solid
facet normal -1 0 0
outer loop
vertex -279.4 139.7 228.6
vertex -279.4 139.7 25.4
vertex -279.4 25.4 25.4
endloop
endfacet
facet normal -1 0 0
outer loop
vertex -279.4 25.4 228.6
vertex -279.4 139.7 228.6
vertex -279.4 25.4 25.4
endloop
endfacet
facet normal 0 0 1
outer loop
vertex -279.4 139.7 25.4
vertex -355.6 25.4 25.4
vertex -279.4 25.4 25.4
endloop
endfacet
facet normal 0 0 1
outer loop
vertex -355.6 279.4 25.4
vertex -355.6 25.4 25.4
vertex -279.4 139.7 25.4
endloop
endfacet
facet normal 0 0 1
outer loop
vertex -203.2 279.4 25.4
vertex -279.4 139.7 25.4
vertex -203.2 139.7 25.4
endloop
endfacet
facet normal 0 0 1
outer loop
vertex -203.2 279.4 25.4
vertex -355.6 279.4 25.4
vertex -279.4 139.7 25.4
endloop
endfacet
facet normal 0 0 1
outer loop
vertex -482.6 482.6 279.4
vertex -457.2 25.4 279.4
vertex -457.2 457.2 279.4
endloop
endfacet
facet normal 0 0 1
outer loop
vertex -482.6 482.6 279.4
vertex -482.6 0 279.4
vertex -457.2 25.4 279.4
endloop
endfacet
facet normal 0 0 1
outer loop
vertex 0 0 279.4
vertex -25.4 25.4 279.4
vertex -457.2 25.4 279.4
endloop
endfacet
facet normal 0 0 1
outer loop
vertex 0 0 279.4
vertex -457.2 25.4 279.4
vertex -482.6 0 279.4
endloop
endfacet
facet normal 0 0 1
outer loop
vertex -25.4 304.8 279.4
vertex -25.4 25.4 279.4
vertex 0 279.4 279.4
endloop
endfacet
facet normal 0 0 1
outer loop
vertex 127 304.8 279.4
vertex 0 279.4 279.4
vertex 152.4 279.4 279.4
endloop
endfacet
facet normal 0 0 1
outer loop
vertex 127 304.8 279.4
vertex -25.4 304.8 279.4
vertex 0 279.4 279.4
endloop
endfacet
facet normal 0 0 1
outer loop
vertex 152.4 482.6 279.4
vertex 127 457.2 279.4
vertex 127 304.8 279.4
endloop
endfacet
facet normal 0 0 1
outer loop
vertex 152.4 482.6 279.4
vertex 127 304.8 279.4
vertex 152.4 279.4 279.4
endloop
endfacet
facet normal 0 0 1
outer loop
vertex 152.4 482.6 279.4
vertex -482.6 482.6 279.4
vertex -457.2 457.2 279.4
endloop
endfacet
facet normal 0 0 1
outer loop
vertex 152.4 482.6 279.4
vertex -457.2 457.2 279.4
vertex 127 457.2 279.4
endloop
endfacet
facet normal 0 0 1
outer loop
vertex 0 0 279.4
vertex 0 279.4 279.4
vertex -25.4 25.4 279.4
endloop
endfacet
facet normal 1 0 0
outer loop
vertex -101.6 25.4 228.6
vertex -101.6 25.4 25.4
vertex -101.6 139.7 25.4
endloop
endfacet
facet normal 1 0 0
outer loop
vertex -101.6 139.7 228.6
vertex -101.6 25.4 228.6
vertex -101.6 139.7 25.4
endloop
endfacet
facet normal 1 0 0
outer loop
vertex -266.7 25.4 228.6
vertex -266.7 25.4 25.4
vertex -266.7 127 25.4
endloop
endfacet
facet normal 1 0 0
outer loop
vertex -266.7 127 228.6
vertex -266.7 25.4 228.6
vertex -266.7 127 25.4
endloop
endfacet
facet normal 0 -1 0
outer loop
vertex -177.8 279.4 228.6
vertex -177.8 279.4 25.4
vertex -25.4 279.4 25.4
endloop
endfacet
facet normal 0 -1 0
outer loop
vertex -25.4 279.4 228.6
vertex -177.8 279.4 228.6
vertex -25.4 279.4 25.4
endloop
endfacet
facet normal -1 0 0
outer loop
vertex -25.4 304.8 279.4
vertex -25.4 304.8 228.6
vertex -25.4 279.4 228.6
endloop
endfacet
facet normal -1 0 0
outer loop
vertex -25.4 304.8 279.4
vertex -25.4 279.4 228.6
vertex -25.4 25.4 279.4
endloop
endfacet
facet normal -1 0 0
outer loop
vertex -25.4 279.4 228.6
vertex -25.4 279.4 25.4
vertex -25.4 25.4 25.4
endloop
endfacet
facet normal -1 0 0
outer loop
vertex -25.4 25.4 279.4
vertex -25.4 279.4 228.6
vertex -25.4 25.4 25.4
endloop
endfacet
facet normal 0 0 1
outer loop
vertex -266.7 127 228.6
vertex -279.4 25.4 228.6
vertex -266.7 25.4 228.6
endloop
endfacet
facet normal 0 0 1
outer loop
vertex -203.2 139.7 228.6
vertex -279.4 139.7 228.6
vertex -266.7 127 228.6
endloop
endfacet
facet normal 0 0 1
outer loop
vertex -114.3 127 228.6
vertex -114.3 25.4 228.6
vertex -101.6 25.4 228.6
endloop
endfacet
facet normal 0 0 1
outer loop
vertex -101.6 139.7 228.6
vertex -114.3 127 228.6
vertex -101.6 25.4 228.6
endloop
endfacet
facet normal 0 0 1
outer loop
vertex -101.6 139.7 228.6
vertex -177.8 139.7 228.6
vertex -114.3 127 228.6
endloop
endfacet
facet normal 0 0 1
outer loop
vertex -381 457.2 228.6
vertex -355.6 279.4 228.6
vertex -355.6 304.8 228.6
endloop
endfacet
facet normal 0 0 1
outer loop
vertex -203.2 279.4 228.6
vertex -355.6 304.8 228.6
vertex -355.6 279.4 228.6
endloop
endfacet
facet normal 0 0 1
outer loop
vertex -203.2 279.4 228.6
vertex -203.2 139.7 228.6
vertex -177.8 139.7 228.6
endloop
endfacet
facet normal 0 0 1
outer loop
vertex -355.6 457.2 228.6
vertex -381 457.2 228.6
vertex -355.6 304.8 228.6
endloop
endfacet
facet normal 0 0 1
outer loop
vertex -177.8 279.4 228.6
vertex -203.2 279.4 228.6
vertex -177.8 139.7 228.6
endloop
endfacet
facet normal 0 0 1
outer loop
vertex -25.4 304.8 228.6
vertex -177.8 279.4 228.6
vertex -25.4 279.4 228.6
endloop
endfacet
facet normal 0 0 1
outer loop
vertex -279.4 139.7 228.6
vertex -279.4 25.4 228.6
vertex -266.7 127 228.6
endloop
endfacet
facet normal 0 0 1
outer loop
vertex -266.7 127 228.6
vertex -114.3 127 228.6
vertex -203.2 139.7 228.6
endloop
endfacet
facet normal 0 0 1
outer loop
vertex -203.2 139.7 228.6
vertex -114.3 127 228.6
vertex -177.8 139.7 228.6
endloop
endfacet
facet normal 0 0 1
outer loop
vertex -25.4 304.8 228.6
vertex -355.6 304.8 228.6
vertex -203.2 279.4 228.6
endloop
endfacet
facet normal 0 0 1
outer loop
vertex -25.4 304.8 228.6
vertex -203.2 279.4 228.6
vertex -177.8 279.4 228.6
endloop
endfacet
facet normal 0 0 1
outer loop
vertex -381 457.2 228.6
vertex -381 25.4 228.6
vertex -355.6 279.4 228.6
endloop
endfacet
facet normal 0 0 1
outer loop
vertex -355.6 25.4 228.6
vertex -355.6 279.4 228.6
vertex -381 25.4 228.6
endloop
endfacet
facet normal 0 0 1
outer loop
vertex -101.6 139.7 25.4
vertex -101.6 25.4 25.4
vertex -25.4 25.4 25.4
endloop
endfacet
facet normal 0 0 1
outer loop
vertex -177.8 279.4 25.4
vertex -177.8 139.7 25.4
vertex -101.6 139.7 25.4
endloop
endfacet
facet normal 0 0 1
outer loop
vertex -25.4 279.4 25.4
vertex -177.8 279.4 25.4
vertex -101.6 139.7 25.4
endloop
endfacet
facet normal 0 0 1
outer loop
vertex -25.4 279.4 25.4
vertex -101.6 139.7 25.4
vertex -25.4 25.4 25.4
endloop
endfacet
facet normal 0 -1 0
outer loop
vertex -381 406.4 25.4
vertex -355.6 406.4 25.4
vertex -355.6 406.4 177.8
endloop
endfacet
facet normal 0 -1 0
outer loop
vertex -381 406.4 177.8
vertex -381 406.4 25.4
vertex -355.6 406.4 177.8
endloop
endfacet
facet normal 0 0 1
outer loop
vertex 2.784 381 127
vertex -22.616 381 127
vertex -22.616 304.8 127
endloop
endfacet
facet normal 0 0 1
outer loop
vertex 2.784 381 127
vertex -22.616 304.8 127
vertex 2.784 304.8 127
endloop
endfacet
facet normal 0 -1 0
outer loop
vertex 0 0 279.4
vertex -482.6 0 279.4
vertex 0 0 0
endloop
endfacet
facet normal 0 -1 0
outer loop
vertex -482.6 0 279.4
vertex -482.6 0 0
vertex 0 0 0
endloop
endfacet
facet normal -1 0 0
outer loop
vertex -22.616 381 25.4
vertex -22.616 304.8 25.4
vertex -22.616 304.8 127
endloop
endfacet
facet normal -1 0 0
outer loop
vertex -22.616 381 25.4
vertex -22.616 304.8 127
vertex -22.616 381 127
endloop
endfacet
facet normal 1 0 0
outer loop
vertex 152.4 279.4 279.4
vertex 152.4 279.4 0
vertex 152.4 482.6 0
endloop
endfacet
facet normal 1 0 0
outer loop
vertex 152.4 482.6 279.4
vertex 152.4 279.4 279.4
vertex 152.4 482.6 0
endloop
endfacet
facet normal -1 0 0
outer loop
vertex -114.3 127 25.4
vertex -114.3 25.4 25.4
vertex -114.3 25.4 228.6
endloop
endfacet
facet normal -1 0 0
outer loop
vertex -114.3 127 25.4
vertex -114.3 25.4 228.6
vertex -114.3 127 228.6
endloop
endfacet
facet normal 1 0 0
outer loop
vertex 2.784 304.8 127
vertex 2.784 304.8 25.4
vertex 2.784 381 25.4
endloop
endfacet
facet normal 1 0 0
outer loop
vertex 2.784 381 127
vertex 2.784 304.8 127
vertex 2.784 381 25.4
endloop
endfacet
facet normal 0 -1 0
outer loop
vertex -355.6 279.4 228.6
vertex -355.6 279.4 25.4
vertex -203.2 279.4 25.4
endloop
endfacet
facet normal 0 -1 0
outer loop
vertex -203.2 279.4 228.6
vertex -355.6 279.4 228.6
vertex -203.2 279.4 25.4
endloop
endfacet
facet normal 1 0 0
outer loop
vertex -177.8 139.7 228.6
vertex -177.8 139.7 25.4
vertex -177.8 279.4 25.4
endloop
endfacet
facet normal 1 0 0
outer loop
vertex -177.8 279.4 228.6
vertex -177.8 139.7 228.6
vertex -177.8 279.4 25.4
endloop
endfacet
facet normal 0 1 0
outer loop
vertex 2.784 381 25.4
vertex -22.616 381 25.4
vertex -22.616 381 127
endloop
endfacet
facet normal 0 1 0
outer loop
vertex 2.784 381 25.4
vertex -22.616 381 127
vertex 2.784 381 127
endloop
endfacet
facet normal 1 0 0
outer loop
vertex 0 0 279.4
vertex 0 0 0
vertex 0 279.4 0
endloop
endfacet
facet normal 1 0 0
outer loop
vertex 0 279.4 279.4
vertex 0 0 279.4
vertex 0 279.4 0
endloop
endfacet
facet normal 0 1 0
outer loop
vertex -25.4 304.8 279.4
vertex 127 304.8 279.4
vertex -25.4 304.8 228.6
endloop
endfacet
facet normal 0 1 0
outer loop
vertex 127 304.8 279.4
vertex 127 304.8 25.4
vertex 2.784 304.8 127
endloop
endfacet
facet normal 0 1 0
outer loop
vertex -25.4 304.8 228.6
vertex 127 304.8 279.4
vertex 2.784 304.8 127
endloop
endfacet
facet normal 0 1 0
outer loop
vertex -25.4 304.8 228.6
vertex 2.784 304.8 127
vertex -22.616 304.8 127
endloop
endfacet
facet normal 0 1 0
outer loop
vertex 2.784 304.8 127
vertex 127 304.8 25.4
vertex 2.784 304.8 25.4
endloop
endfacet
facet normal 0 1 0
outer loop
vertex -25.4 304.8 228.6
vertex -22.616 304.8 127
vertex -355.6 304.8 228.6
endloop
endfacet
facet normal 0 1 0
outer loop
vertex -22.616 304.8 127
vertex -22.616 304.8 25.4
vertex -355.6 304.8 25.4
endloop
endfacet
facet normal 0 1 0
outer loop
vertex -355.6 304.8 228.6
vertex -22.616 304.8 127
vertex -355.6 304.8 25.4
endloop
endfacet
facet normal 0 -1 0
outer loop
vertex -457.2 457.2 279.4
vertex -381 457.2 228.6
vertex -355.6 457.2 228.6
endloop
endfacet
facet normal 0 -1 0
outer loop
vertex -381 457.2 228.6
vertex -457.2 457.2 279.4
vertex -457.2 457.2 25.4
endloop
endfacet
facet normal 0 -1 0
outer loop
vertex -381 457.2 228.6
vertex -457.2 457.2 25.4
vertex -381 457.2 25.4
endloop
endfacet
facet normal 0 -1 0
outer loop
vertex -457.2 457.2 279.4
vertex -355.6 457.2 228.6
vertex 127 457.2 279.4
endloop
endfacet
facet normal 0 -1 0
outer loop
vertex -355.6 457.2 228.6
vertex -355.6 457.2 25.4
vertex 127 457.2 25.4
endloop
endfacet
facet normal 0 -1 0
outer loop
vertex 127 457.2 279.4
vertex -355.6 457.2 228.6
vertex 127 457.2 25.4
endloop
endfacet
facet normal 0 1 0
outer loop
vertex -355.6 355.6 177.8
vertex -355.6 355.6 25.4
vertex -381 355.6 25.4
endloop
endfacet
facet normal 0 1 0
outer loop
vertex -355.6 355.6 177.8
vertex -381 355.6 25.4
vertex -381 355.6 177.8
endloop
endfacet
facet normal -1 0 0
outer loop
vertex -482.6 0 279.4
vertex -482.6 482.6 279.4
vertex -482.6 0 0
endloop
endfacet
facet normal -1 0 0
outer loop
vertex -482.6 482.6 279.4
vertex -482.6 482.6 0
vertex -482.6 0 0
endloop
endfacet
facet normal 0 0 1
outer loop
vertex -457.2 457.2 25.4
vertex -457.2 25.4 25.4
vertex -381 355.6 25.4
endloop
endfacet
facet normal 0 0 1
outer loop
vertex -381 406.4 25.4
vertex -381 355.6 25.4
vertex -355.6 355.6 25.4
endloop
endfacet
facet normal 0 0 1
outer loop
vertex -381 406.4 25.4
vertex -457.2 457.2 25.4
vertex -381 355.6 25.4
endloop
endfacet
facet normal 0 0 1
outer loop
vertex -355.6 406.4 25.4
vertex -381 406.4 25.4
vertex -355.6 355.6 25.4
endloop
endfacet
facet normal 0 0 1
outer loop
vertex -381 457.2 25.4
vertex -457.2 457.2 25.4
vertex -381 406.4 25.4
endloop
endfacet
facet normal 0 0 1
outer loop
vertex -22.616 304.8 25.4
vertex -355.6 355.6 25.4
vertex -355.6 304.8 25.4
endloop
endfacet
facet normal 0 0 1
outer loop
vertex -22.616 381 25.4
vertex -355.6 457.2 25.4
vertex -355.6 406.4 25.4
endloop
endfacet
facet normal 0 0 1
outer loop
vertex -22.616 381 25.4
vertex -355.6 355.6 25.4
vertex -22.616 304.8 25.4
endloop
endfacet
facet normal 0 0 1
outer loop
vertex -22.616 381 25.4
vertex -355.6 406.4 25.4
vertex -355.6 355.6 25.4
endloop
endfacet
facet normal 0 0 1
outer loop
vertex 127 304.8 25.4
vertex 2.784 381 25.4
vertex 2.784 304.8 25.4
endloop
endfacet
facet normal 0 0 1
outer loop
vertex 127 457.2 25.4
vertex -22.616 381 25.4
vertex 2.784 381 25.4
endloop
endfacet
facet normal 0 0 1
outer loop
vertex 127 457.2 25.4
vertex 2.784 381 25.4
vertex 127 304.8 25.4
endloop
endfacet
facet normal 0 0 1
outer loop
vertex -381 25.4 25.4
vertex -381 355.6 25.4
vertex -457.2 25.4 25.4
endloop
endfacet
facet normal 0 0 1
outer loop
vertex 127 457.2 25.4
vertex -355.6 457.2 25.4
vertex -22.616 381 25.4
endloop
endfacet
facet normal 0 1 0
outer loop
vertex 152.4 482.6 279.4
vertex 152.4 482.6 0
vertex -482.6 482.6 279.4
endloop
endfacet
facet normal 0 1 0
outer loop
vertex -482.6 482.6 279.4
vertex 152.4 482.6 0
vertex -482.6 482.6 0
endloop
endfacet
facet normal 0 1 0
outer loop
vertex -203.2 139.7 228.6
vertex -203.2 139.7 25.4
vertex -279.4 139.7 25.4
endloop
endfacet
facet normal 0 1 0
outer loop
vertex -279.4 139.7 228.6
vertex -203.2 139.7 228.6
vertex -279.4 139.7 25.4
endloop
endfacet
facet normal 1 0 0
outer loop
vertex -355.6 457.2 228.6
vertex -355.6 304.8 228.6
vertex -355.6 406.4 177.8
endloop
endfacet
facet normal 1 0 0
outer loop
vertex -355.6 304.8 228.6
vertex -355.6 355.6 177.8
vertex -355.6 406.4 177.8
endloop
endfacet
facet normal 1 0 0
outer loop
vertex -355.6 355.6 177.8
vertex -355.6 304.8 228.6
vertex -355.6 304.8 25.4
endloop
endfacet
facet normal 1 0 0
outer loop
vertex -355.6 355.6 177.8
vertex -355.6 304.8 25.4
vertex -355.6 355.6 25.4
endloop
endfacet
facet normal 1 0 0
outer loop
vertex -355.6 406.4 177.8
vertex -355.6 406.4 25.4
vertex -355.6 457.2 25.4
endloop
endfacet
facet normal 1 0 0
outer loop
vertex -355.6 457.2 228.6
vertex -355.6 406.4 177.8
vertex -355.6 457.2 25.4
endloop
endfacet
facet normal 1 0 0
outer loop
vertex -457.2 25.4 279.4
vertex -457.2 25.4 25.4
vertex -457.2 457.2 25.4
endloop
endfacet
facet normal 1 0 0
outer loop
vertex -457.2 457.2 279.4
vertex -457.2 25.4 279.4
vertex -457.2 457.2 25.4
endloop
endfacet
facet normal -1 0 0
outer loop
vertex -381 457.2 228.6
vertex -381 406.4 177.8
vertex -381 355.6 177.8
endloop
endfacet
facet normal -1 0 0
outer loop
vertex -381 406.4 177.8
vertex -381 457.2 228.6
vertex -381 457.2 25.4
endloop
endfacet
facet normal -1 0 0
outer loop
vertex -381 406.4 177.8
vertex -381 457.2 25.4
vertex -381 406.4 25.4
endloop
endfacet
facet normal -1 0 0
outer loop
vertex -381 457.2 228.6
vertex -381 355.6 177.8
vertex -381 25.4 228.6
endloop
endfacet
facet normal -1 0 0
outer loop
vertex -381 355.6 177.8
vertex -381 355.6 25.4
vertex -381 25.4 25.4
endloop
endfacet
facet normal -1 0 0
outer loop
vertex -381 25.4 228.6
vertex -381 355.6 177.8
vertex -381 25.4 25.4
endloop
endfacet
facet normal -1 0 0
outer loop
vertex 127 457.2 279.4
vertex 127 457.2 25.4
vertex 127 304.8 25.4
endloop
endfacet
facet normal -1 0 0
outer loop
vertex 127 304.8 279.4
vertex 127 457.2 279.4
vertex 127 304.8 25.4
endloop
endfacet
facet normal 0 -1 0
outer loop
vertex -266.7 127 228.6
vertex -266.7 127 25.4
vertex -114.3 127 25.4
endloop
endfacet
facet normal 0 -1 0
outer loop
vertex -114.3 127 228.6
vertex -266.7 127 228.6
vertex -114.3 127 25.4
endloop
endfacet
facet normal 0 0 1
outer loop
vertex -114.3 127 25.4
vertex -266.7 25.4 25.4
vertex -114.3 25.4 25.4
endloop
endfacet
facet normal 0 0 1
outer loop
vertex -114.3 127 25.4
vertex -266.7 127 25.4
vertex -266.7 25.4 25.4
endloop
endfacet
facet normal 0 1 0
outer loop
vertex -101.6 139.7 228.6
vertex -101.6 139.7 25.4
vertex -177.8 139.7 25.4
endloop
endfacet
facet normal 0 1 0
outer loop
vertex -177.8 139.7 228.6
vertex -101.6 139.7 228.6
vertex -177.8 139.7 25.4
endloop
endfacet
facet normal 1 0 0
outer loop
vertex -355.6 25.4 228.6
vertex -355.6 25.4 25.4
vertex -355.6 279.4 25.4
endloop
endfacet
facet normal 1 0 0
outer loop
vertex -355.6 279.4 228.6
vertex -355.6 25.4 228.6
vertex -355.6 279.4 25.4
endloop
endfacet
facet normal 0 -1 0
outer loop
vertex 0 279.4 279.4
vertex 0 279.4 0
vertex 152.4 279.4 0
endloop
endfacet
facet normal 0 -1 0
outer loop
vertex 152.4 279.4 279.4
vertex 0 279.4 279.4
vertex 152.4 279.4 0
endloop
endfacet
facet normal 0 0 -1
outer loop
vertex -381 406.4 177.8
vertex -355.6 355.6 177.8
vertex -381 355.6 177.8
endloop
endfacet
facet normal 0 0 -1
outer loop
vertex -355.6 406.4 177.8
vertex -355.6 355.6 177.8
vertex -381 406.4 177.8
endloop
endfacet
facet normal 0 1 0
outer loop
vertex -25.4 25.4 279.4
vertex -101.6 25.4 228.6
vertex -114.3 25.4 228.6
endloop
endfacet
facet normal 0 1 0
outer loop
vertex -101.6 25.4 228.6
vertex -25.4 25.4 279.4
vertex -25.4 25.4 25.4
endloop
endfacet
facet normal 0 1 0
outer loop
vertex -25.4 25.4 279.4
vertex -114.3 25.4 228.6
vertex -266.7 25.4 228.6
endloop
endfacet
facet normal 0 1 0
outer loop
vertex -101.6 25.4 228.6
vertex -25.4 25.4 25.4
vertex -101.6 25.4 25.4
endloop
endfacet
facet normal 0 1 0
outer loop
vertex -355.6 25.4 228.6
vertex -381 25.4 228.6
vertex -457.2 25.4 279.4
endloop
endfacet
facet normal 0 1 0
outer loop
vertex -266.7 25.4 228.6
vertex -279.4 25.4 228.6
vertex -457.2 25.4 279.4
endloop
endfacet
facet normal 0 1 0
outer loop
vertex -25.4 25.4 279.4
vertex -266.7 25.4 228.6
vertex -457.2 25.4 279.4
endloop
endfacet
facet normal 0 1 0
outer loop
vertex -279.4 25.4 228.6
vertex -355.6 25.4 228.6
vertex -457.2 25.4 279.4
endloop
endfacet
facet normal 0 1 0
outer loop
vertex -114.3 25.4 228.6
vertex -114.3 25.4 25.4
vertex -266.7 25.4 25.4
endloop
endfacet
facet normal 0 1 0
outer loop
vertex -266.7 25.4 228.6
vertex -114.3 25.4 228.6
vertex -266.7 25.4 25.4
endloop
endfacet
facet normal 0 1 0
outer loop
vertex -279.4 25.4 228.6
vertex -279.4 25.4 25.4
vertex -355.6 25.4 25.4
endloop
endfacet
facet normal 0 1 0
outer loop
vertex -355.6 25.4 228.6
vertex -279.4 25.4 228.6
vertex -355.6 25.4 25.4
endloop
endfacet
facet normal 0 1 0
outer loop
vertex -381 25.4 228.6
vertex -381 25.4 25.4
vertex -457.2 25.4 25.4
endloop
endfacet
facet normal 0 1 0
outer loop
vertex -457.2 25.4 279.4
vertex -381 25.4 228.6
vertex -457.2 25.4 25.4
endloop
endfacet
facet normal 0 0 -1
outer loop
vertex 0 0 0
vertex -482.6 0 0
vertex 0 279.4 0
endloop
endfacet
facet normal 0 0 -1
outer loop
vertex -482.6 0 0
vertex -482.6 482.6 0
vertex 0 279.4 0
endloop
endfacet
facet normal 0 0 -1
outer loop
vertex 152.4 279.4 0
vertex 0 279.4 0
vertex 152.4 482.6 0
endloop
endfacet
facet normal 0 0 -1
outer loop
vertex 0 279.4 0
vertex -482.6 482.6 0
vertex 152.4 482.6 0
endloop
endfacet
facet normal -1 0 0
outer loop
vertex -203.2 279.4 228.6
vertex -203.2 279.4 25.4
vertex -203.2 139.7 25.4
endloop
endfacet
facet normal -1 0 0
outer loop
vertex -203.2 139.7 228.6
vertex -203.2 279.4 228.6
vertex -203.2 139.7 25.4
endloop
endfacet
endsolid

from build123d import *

# Parameters (mm, degrees)
F1_DEPTH = 25.4
F3_DEPTH = 254
F4_W     = 25.4
F4_H     = 139.7
F4_H_2   = 25.4
F4_H_3   = 12.7
F4_W_2   = 63.5
F4_W_3   = 12.7
F4_H_4   = 254
F4_H_5   = 152.4
F4_H_6   = 101.6
F5_DEPTH = 203.2
F6_W     = 25.4
F6_H     = 76.2
F7_DEPTH = 101.6
F8_W     = 50.8
F8_H     = 152.4
F9_DEPTH = 25.4


with BuildPart() as f1:
    # F0 (on Top) → F1 (new body)
    with BuildSketch(Plane.XY):
        Polygon((-482.6, 0), (0, 0), (0, 279.4), (152.4, 279.4), (152.4, 482.6), (-482.6, 482.6), align=None)
    extrude(amount=F1_DEPTH)

    # F2 (on face) → F3 (join)
    with BuildSketch(Plane.XY.offset(25.4)):
        Polygon((152.4, 279.4), (152.4, 482.6), (-482.6, 482.6), (-482.6, 0), (0, 0), (0, 279.4), align=None)
        Polygon((-25.4, 25.4), (-457.2, 25.4), (-457.2, 457.2), (127, 457.2), (127, 304.8), (-25.4, 304.8), align=None, mode=Mode.SUBTRACT)
    extrude(amount=F3_DEPTH)

    # F4 (on face) → F5 (join)
    with BuildSketch(Plane.XY.offset(25.4)):
        with Locations((-190.5, 209.55)):
            Rectangle(F4_W, F4_H)
        with Locations((-368.3, 292.1)):
            Rectangle(F4_W, F4_H_2)
        with Locations((-190.5, 133.35)):
            Rectangle(F4_W, F4_H_3)
        with Locations((-234.95, 133.35)):
            Rectangle(F4_W_2, F4_H_3)
        with Locations((-146.05, 133.35)):
            Rectangle(F4_W_2, F4_H_3)
        with Locations((-273.05, 133.35)):
            Rectangle(F4_W_3, F4_H_3)
        with Locations((-107.95, 133.35)):
            Rectangle(F4_W_3, F4_H_3)
        with Locations((-368.3, 152.4)):
            Rectangle(F4_W, F4_H_4)
        Polygon((-355.6, 304.8), (-355.6, 279.4), (-203.2, 279.4), (-177.8, 279.4), (-25.4, 279.4), (-25.4, 304.8), align=None)
        with Locations((-368.3, 381)):
            Rectangle(F4_W, F4_H_5)
        with Locations((-107.95, 76.2)):
            Rectangle(F4_W_3, F4_H_6)
        with Locations((-273.05, 76.2)):
            Rectangle(F4_W_3, F4_H_6)
    extrude(amount=F5_DEPTH)

    # F6 (on face) → F7 (join)
    with BuildSketch(Plane.XY.offset(25.4)):
        with Locations((-9.9159989834, 342.9)):
            Rectangle(F6_W, F6_H)
    extrude(amount=F7_DEPTH)

    # F8 (on face) → F9 (cut)
    with BuildSketch(Plane.YZ.offset(-355.6)):
        with Locations((381, 101.6)):
            Rectangle(F8_W, F8_H)
    extrude(amount=-F9_DEPTH, mode=Mode.SUBTRACT)


solid = f1.part
